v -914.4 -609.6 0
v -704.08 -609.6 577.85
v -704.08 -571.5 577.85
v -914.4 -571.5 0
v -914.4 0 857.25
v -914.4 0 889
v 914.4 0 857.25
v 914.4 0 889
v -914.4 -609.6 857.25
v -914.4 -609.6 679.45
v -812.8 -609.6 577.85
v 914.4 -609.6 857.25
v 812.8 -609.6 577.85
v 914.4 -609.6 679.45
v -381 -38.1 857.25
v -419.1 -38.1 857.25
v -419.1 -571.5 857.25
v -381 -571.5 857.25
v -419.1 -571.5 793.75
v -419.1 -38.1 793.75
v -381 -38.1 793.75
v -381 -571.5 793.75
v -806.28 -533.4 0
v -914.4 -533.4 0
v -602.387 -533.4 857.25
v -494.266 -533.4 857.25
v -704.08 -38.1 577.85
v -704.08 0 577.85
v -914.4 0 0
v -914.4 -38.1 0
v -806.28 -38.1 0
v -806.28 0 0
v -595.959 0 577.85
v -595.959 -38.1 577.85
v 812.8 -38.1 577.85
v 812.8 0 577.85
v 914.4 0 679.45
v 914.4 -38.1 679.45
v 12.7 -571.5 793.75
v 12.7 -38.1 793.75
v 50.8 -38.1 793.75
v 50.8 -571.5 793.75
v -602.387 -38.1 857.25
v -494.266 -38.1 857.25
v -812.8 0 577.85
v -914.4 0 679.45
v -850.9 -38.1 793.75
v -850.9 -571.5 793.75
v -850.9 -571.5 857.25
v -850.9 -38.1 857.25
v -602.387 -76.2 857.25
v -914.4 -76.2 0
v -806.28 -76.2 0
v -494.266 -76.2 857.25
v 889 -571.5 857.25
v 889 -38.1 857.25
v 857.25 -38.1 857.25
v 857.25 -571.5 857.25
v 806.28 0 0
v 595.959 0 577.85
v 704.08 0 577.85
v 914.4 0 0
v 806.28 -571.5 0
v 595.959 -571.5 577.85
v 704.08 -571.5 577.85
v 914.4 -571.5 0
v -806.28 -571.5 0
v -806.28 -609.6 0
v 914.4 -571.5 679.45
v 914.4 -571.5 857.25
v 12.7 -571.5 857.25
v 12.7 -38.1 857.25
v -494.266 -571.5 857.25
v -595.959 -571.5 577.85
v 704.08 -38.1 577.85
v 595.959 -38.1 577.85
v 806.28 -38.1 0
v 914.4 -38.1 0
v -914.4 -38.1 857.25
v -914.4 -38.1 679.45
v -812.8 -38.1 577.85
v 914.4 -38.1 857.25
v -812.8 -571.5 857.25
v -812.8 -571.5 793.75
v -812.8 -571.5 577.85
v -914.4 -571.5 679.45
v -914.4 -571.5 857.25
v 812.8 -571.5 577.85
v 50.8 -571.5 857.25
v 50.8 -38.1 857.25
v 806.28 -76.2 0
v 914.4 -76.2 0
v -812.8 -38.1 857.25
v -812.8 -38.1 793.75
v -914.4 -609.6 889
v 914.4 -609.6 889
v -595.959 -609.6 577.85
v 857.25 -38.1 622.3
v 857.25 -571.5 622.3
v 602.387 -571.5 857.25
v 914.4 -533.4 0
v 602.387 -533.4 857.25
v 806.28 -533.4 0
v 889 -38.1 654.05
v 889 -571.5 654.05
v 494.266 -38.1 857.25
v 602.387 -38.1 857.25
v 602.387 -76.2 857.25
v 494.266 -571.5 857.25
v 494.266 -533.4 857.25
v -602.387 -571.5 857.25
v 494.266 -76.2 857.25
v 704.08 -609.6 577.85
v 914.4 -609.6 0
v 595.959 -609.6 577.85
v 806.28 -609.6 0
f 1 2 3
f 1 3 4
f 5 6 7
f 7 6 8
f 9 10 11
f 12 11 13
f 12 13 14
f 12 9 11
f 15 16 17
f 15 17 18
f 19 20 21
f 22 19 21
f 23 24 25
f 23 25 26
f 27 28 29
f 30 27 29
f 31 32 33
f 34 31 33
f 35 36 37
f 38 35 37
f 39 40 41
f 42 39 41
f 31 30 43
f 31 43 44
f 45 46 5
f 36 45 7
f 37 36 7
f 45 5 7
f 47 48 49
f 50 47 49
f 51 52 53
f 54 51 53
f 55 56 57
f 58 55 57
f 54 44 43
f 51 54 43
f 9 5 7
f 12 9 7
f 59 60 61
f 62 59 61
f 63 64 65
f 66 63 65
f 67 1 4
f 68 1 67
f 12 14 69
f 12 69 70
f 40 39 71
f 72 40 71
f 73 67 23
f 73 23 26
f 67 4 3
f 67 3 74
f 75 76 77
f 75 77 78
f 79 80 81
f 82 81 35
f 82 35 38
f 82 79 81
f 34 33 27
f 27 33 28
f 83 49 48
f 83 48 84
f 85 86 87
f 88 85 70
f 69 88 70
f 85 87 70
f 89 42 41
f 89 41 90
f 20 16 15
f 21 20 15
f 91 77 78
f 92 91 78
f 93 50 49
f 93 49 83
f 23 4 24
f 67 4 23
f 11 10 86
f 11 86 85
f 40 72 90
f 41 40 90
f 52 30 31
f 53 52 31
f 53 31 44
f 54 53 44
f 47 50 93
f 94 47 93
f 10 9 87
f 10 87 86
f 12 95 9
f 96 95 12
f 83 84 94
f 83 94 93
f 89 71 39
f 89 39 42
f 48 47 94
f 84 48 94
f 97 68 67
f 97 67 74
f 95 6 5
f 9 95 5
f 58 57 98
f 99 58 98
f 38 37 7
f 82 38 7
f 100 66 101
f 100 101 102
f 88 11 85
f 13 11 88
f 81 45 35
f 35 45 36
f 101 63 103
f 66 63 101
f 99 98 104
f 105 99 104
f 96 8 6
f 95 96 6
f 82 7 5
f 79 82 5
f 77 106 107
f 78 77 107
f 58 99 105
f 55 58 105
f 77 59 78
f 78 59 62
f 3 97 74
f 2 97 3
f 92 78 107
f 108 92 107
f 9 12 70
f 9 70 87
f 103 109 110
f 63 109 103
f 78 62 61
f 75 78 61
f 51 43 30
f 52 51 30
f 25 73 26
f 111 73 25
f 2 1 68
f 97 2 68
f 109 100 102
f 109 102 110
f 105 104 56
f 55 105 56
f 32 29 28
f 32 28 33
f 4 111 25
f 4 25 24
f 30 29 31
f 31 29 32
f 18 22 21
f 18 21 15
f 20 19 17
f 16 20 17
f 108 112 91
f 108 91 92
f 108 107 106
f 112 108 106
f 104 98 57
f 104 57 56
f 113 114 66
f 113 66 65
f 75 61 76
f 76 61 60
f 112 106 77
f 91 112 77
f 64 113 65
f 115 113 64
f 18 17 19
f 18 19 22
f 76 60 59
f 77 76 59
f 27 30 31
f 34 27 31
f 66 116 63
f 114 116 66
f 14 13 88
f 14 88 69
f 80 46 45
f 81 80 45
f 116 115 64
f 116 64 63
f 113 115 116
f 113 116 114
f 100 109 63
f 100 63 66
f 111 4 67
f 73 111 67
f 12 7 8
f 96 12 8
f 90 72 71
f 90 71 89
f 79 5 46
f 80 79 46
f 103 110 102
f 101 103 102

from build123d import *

# Parameters (mm, degrees)
F1_DEPTH  = 609.6
F2_DEPTH  = 38.1
F3_DEPTH  = 38.1
F5_DEPTH  = 38.1
F8_DEPTH  = 38.1
F6_W      = 38.1
F6_H      = 63.5
F12_DEPTH = 533.4


with BuildPart() as f1:
    # F0 (on Front) → F1 (new body)
    with BuildSketch(Plane.XZ):
        Polygon((914.4, 889), (-914.4, 889), (-914.4, 857.25), (-602.3865166753, 857.25), (-494.2660549917, 857.25), (494.2660549917, 857.25), (602.3865166753, 857.25), (914.4, 857.25), align=None)
    extrude(amount=F1_DEPTH)


with BuildPart() as f2:
    # F0 (on Front) → F2 (new body)
    with BuildSketch(Plane.XZ):
        Polygon((-602.3865166753, 857.25), (-914.4, 857.25), (-914.4, 679.45), (-812.8, 577.85), (-704.0798001293, 577.85), align=None)
        Polygon((494.2660549917, 857.25), (-494.2660549917, 857.25), (-595.9593384457, 577.85), (595.9593384457, 577.85), align=None)
        Polygon((704.0798001293, 577.85), (602.3865166753, 857.25), (494.2660549917, 857.25), (595.9593384457, 577.85), align=None)
        Polygon((914.4, 679.45), (914.4, 857.25), (602.3865166753, 857.25), (704.0798001293, 577.85), (812.8, 577.85), align=None)
        Polygon((-494.2660549917, 857.25), (-602.3865166753, 857.25), (-704.0798001293, 577.85), (-595.9593384457, 577.85), align=None)
    extrude(amount=F2_DEPTH)


with BuildPart() as f3:
    # F0 (on Front) → F3 (new body, through all)
    with BuildSketch(Plane.XZ):
        Polygon((-595.9593384457, 577.85), (-704.0798001293, 577.85), (-914.4, 0), (-806.2795383164, 0), align=None)
    extrude(amount=F3_DEPTH)


with BuildPart() as f3b:
    # F0 (on Front) → F3, piece 2 (new body, through all)
    with BuildSketch(Plane.XZ):
        Polygon((914.4, 0), (704.0798001293, 577.85), (595.9593384457, 577.85), (806.2795383164, 0), align=None)
    extrude(amount=F3_DEPTH)


with BuildPart() as f5:
    # F4 (on face) → F5 (new body)
    with BuildSketch(Plane.XZ.offset(38.1)):
        Polygon((-704.0798001293, 577.85), (-595.9593384457, 577.85), (-494.2660549917, 857.25), (-602.3865166753, 857.25), align=None)
        Polygon((-914.4, 0), (-806.2795383164, 0), (-595.9593384457, 577.85), (-704.0798001293, 577.85), align=None)
    extrude(amount=F5_DEPTH)


with BuildPart() as f5b:
    # F4 (on face) → F5, piece 2 (new body)
    with BuildSketch(Plane.XZ.offset(38.1)):
        Polygon((494.2660549917, 857.25), (595.9593384457, 577.85), (704.0798001293, 577.85), (602.3865166753, 857.25), align=None)
        Polygon((704.0798001293, 577.85), (595.9593384457, 577.85), (806.2795383164, 0), (914.4, 0), align=None)
    extrude(amount=F5_DEPTH)


with BuildPart() as f8:
    # F7 (on face) → F8 (new body)
    with BuildSketch(Plane.XZ.offset(609.6)):
        Polygon((-704.0798001293, 577.85), (-602.3865166753, 857.25), (-914.4, 857.25), (-914.4, 679.45), (-812.8, 577.85), align=None)
        Polygon((-595.9593384457, 577.85), (-494.2660549917, 857.25), (-602.3865166753, 857.25), (-704.0798001293, 577.85), align=None)
        Polygon((595.9593384457, 577.85), (494.2660549917, 857.25), (-494.2660549917, 857.25), (-595.9593384457, 577.85), align=None)
        Polygon((602.3865166753, 857.25), (494.2660549917, 857.25), (595.9593384457, 577.85), (704.0798001293, 577.85), align=None)
        Polygon((914.4, 857.25), (602.3865166753, 857.25), (704.0798001293, 577.85), (812.8, 577.85), (914.4, 679.45), align=None)
    extrude(amount=-F8_DEPTH)


with BuildPart() as f11_1:
    # F11: instance of F5b
    add(f5b.part.mirror(Plane.XZ.offset(304.8)))


with BuildPart() as f11_2:
    # F11: instance of F5
    add(f5.part.mirror(Plane.XZ.offset(304.8)))


with BuildPart() as f11_3:
    # F11: instance of F3
    add(f3.part.mirror(Plane.XZ.offset(304.8)))


with BuildPart() as f11_4:
    # F11: instance of F3b
    add(f3b.part.mirror(Plane.XZ.offset(304.8)))


with BuildPart() as f12:
    # F6 (on face) → F12 (new body, through all)
    with BuildSketch(Plane.XZ.offset(38.1)):
        with Locations((-831.85, 825.5)):
            Rectangle(F6_W, F6_H)
    extrude(amount=F12_DEPTH)


with BuildPart() as f12b:
    # F6 (on face) → F12, piece 2 (new body, through all)
    with BuildSketch(Plane.XZ.offset(38.1)):
        with Locations((-400.05, 825.5)):
            Rectangle(F6_W, F6_H)
    extrude(amount=F12_DEPTH)


with BuildPart() as f12c:
    # F6 (on face) → F12, piece 3 (new body, through all)
    with BuildSketch(Plane.XZ.offset(38.1)):
        with Locations((31.75, 825.5)):
            Rectangle(F6_W, F6_H)
    extrude(amount=F12_DEPTH)


with BuildPart() as f12d:
    # F6 (on face) → F12, piece 4 (new body, through all)
    with BuildSketch(Plane.XZ.offset(38.1)):
        Polygon((889, 857.25), (857.25, 857.25), (857.25, 622.3), (889, 654.05), align=None)
    extrude(amount=F12_DEPTH)


solid = Compound([f1.part, f2.part, f3.part, f3b.part, f5.part, f5b.part, f8.part, f11_1.part, f11_2.part, f11_3.part, f11_4.part, f12.part, f12b.part, f12c.part, f12d.part])
